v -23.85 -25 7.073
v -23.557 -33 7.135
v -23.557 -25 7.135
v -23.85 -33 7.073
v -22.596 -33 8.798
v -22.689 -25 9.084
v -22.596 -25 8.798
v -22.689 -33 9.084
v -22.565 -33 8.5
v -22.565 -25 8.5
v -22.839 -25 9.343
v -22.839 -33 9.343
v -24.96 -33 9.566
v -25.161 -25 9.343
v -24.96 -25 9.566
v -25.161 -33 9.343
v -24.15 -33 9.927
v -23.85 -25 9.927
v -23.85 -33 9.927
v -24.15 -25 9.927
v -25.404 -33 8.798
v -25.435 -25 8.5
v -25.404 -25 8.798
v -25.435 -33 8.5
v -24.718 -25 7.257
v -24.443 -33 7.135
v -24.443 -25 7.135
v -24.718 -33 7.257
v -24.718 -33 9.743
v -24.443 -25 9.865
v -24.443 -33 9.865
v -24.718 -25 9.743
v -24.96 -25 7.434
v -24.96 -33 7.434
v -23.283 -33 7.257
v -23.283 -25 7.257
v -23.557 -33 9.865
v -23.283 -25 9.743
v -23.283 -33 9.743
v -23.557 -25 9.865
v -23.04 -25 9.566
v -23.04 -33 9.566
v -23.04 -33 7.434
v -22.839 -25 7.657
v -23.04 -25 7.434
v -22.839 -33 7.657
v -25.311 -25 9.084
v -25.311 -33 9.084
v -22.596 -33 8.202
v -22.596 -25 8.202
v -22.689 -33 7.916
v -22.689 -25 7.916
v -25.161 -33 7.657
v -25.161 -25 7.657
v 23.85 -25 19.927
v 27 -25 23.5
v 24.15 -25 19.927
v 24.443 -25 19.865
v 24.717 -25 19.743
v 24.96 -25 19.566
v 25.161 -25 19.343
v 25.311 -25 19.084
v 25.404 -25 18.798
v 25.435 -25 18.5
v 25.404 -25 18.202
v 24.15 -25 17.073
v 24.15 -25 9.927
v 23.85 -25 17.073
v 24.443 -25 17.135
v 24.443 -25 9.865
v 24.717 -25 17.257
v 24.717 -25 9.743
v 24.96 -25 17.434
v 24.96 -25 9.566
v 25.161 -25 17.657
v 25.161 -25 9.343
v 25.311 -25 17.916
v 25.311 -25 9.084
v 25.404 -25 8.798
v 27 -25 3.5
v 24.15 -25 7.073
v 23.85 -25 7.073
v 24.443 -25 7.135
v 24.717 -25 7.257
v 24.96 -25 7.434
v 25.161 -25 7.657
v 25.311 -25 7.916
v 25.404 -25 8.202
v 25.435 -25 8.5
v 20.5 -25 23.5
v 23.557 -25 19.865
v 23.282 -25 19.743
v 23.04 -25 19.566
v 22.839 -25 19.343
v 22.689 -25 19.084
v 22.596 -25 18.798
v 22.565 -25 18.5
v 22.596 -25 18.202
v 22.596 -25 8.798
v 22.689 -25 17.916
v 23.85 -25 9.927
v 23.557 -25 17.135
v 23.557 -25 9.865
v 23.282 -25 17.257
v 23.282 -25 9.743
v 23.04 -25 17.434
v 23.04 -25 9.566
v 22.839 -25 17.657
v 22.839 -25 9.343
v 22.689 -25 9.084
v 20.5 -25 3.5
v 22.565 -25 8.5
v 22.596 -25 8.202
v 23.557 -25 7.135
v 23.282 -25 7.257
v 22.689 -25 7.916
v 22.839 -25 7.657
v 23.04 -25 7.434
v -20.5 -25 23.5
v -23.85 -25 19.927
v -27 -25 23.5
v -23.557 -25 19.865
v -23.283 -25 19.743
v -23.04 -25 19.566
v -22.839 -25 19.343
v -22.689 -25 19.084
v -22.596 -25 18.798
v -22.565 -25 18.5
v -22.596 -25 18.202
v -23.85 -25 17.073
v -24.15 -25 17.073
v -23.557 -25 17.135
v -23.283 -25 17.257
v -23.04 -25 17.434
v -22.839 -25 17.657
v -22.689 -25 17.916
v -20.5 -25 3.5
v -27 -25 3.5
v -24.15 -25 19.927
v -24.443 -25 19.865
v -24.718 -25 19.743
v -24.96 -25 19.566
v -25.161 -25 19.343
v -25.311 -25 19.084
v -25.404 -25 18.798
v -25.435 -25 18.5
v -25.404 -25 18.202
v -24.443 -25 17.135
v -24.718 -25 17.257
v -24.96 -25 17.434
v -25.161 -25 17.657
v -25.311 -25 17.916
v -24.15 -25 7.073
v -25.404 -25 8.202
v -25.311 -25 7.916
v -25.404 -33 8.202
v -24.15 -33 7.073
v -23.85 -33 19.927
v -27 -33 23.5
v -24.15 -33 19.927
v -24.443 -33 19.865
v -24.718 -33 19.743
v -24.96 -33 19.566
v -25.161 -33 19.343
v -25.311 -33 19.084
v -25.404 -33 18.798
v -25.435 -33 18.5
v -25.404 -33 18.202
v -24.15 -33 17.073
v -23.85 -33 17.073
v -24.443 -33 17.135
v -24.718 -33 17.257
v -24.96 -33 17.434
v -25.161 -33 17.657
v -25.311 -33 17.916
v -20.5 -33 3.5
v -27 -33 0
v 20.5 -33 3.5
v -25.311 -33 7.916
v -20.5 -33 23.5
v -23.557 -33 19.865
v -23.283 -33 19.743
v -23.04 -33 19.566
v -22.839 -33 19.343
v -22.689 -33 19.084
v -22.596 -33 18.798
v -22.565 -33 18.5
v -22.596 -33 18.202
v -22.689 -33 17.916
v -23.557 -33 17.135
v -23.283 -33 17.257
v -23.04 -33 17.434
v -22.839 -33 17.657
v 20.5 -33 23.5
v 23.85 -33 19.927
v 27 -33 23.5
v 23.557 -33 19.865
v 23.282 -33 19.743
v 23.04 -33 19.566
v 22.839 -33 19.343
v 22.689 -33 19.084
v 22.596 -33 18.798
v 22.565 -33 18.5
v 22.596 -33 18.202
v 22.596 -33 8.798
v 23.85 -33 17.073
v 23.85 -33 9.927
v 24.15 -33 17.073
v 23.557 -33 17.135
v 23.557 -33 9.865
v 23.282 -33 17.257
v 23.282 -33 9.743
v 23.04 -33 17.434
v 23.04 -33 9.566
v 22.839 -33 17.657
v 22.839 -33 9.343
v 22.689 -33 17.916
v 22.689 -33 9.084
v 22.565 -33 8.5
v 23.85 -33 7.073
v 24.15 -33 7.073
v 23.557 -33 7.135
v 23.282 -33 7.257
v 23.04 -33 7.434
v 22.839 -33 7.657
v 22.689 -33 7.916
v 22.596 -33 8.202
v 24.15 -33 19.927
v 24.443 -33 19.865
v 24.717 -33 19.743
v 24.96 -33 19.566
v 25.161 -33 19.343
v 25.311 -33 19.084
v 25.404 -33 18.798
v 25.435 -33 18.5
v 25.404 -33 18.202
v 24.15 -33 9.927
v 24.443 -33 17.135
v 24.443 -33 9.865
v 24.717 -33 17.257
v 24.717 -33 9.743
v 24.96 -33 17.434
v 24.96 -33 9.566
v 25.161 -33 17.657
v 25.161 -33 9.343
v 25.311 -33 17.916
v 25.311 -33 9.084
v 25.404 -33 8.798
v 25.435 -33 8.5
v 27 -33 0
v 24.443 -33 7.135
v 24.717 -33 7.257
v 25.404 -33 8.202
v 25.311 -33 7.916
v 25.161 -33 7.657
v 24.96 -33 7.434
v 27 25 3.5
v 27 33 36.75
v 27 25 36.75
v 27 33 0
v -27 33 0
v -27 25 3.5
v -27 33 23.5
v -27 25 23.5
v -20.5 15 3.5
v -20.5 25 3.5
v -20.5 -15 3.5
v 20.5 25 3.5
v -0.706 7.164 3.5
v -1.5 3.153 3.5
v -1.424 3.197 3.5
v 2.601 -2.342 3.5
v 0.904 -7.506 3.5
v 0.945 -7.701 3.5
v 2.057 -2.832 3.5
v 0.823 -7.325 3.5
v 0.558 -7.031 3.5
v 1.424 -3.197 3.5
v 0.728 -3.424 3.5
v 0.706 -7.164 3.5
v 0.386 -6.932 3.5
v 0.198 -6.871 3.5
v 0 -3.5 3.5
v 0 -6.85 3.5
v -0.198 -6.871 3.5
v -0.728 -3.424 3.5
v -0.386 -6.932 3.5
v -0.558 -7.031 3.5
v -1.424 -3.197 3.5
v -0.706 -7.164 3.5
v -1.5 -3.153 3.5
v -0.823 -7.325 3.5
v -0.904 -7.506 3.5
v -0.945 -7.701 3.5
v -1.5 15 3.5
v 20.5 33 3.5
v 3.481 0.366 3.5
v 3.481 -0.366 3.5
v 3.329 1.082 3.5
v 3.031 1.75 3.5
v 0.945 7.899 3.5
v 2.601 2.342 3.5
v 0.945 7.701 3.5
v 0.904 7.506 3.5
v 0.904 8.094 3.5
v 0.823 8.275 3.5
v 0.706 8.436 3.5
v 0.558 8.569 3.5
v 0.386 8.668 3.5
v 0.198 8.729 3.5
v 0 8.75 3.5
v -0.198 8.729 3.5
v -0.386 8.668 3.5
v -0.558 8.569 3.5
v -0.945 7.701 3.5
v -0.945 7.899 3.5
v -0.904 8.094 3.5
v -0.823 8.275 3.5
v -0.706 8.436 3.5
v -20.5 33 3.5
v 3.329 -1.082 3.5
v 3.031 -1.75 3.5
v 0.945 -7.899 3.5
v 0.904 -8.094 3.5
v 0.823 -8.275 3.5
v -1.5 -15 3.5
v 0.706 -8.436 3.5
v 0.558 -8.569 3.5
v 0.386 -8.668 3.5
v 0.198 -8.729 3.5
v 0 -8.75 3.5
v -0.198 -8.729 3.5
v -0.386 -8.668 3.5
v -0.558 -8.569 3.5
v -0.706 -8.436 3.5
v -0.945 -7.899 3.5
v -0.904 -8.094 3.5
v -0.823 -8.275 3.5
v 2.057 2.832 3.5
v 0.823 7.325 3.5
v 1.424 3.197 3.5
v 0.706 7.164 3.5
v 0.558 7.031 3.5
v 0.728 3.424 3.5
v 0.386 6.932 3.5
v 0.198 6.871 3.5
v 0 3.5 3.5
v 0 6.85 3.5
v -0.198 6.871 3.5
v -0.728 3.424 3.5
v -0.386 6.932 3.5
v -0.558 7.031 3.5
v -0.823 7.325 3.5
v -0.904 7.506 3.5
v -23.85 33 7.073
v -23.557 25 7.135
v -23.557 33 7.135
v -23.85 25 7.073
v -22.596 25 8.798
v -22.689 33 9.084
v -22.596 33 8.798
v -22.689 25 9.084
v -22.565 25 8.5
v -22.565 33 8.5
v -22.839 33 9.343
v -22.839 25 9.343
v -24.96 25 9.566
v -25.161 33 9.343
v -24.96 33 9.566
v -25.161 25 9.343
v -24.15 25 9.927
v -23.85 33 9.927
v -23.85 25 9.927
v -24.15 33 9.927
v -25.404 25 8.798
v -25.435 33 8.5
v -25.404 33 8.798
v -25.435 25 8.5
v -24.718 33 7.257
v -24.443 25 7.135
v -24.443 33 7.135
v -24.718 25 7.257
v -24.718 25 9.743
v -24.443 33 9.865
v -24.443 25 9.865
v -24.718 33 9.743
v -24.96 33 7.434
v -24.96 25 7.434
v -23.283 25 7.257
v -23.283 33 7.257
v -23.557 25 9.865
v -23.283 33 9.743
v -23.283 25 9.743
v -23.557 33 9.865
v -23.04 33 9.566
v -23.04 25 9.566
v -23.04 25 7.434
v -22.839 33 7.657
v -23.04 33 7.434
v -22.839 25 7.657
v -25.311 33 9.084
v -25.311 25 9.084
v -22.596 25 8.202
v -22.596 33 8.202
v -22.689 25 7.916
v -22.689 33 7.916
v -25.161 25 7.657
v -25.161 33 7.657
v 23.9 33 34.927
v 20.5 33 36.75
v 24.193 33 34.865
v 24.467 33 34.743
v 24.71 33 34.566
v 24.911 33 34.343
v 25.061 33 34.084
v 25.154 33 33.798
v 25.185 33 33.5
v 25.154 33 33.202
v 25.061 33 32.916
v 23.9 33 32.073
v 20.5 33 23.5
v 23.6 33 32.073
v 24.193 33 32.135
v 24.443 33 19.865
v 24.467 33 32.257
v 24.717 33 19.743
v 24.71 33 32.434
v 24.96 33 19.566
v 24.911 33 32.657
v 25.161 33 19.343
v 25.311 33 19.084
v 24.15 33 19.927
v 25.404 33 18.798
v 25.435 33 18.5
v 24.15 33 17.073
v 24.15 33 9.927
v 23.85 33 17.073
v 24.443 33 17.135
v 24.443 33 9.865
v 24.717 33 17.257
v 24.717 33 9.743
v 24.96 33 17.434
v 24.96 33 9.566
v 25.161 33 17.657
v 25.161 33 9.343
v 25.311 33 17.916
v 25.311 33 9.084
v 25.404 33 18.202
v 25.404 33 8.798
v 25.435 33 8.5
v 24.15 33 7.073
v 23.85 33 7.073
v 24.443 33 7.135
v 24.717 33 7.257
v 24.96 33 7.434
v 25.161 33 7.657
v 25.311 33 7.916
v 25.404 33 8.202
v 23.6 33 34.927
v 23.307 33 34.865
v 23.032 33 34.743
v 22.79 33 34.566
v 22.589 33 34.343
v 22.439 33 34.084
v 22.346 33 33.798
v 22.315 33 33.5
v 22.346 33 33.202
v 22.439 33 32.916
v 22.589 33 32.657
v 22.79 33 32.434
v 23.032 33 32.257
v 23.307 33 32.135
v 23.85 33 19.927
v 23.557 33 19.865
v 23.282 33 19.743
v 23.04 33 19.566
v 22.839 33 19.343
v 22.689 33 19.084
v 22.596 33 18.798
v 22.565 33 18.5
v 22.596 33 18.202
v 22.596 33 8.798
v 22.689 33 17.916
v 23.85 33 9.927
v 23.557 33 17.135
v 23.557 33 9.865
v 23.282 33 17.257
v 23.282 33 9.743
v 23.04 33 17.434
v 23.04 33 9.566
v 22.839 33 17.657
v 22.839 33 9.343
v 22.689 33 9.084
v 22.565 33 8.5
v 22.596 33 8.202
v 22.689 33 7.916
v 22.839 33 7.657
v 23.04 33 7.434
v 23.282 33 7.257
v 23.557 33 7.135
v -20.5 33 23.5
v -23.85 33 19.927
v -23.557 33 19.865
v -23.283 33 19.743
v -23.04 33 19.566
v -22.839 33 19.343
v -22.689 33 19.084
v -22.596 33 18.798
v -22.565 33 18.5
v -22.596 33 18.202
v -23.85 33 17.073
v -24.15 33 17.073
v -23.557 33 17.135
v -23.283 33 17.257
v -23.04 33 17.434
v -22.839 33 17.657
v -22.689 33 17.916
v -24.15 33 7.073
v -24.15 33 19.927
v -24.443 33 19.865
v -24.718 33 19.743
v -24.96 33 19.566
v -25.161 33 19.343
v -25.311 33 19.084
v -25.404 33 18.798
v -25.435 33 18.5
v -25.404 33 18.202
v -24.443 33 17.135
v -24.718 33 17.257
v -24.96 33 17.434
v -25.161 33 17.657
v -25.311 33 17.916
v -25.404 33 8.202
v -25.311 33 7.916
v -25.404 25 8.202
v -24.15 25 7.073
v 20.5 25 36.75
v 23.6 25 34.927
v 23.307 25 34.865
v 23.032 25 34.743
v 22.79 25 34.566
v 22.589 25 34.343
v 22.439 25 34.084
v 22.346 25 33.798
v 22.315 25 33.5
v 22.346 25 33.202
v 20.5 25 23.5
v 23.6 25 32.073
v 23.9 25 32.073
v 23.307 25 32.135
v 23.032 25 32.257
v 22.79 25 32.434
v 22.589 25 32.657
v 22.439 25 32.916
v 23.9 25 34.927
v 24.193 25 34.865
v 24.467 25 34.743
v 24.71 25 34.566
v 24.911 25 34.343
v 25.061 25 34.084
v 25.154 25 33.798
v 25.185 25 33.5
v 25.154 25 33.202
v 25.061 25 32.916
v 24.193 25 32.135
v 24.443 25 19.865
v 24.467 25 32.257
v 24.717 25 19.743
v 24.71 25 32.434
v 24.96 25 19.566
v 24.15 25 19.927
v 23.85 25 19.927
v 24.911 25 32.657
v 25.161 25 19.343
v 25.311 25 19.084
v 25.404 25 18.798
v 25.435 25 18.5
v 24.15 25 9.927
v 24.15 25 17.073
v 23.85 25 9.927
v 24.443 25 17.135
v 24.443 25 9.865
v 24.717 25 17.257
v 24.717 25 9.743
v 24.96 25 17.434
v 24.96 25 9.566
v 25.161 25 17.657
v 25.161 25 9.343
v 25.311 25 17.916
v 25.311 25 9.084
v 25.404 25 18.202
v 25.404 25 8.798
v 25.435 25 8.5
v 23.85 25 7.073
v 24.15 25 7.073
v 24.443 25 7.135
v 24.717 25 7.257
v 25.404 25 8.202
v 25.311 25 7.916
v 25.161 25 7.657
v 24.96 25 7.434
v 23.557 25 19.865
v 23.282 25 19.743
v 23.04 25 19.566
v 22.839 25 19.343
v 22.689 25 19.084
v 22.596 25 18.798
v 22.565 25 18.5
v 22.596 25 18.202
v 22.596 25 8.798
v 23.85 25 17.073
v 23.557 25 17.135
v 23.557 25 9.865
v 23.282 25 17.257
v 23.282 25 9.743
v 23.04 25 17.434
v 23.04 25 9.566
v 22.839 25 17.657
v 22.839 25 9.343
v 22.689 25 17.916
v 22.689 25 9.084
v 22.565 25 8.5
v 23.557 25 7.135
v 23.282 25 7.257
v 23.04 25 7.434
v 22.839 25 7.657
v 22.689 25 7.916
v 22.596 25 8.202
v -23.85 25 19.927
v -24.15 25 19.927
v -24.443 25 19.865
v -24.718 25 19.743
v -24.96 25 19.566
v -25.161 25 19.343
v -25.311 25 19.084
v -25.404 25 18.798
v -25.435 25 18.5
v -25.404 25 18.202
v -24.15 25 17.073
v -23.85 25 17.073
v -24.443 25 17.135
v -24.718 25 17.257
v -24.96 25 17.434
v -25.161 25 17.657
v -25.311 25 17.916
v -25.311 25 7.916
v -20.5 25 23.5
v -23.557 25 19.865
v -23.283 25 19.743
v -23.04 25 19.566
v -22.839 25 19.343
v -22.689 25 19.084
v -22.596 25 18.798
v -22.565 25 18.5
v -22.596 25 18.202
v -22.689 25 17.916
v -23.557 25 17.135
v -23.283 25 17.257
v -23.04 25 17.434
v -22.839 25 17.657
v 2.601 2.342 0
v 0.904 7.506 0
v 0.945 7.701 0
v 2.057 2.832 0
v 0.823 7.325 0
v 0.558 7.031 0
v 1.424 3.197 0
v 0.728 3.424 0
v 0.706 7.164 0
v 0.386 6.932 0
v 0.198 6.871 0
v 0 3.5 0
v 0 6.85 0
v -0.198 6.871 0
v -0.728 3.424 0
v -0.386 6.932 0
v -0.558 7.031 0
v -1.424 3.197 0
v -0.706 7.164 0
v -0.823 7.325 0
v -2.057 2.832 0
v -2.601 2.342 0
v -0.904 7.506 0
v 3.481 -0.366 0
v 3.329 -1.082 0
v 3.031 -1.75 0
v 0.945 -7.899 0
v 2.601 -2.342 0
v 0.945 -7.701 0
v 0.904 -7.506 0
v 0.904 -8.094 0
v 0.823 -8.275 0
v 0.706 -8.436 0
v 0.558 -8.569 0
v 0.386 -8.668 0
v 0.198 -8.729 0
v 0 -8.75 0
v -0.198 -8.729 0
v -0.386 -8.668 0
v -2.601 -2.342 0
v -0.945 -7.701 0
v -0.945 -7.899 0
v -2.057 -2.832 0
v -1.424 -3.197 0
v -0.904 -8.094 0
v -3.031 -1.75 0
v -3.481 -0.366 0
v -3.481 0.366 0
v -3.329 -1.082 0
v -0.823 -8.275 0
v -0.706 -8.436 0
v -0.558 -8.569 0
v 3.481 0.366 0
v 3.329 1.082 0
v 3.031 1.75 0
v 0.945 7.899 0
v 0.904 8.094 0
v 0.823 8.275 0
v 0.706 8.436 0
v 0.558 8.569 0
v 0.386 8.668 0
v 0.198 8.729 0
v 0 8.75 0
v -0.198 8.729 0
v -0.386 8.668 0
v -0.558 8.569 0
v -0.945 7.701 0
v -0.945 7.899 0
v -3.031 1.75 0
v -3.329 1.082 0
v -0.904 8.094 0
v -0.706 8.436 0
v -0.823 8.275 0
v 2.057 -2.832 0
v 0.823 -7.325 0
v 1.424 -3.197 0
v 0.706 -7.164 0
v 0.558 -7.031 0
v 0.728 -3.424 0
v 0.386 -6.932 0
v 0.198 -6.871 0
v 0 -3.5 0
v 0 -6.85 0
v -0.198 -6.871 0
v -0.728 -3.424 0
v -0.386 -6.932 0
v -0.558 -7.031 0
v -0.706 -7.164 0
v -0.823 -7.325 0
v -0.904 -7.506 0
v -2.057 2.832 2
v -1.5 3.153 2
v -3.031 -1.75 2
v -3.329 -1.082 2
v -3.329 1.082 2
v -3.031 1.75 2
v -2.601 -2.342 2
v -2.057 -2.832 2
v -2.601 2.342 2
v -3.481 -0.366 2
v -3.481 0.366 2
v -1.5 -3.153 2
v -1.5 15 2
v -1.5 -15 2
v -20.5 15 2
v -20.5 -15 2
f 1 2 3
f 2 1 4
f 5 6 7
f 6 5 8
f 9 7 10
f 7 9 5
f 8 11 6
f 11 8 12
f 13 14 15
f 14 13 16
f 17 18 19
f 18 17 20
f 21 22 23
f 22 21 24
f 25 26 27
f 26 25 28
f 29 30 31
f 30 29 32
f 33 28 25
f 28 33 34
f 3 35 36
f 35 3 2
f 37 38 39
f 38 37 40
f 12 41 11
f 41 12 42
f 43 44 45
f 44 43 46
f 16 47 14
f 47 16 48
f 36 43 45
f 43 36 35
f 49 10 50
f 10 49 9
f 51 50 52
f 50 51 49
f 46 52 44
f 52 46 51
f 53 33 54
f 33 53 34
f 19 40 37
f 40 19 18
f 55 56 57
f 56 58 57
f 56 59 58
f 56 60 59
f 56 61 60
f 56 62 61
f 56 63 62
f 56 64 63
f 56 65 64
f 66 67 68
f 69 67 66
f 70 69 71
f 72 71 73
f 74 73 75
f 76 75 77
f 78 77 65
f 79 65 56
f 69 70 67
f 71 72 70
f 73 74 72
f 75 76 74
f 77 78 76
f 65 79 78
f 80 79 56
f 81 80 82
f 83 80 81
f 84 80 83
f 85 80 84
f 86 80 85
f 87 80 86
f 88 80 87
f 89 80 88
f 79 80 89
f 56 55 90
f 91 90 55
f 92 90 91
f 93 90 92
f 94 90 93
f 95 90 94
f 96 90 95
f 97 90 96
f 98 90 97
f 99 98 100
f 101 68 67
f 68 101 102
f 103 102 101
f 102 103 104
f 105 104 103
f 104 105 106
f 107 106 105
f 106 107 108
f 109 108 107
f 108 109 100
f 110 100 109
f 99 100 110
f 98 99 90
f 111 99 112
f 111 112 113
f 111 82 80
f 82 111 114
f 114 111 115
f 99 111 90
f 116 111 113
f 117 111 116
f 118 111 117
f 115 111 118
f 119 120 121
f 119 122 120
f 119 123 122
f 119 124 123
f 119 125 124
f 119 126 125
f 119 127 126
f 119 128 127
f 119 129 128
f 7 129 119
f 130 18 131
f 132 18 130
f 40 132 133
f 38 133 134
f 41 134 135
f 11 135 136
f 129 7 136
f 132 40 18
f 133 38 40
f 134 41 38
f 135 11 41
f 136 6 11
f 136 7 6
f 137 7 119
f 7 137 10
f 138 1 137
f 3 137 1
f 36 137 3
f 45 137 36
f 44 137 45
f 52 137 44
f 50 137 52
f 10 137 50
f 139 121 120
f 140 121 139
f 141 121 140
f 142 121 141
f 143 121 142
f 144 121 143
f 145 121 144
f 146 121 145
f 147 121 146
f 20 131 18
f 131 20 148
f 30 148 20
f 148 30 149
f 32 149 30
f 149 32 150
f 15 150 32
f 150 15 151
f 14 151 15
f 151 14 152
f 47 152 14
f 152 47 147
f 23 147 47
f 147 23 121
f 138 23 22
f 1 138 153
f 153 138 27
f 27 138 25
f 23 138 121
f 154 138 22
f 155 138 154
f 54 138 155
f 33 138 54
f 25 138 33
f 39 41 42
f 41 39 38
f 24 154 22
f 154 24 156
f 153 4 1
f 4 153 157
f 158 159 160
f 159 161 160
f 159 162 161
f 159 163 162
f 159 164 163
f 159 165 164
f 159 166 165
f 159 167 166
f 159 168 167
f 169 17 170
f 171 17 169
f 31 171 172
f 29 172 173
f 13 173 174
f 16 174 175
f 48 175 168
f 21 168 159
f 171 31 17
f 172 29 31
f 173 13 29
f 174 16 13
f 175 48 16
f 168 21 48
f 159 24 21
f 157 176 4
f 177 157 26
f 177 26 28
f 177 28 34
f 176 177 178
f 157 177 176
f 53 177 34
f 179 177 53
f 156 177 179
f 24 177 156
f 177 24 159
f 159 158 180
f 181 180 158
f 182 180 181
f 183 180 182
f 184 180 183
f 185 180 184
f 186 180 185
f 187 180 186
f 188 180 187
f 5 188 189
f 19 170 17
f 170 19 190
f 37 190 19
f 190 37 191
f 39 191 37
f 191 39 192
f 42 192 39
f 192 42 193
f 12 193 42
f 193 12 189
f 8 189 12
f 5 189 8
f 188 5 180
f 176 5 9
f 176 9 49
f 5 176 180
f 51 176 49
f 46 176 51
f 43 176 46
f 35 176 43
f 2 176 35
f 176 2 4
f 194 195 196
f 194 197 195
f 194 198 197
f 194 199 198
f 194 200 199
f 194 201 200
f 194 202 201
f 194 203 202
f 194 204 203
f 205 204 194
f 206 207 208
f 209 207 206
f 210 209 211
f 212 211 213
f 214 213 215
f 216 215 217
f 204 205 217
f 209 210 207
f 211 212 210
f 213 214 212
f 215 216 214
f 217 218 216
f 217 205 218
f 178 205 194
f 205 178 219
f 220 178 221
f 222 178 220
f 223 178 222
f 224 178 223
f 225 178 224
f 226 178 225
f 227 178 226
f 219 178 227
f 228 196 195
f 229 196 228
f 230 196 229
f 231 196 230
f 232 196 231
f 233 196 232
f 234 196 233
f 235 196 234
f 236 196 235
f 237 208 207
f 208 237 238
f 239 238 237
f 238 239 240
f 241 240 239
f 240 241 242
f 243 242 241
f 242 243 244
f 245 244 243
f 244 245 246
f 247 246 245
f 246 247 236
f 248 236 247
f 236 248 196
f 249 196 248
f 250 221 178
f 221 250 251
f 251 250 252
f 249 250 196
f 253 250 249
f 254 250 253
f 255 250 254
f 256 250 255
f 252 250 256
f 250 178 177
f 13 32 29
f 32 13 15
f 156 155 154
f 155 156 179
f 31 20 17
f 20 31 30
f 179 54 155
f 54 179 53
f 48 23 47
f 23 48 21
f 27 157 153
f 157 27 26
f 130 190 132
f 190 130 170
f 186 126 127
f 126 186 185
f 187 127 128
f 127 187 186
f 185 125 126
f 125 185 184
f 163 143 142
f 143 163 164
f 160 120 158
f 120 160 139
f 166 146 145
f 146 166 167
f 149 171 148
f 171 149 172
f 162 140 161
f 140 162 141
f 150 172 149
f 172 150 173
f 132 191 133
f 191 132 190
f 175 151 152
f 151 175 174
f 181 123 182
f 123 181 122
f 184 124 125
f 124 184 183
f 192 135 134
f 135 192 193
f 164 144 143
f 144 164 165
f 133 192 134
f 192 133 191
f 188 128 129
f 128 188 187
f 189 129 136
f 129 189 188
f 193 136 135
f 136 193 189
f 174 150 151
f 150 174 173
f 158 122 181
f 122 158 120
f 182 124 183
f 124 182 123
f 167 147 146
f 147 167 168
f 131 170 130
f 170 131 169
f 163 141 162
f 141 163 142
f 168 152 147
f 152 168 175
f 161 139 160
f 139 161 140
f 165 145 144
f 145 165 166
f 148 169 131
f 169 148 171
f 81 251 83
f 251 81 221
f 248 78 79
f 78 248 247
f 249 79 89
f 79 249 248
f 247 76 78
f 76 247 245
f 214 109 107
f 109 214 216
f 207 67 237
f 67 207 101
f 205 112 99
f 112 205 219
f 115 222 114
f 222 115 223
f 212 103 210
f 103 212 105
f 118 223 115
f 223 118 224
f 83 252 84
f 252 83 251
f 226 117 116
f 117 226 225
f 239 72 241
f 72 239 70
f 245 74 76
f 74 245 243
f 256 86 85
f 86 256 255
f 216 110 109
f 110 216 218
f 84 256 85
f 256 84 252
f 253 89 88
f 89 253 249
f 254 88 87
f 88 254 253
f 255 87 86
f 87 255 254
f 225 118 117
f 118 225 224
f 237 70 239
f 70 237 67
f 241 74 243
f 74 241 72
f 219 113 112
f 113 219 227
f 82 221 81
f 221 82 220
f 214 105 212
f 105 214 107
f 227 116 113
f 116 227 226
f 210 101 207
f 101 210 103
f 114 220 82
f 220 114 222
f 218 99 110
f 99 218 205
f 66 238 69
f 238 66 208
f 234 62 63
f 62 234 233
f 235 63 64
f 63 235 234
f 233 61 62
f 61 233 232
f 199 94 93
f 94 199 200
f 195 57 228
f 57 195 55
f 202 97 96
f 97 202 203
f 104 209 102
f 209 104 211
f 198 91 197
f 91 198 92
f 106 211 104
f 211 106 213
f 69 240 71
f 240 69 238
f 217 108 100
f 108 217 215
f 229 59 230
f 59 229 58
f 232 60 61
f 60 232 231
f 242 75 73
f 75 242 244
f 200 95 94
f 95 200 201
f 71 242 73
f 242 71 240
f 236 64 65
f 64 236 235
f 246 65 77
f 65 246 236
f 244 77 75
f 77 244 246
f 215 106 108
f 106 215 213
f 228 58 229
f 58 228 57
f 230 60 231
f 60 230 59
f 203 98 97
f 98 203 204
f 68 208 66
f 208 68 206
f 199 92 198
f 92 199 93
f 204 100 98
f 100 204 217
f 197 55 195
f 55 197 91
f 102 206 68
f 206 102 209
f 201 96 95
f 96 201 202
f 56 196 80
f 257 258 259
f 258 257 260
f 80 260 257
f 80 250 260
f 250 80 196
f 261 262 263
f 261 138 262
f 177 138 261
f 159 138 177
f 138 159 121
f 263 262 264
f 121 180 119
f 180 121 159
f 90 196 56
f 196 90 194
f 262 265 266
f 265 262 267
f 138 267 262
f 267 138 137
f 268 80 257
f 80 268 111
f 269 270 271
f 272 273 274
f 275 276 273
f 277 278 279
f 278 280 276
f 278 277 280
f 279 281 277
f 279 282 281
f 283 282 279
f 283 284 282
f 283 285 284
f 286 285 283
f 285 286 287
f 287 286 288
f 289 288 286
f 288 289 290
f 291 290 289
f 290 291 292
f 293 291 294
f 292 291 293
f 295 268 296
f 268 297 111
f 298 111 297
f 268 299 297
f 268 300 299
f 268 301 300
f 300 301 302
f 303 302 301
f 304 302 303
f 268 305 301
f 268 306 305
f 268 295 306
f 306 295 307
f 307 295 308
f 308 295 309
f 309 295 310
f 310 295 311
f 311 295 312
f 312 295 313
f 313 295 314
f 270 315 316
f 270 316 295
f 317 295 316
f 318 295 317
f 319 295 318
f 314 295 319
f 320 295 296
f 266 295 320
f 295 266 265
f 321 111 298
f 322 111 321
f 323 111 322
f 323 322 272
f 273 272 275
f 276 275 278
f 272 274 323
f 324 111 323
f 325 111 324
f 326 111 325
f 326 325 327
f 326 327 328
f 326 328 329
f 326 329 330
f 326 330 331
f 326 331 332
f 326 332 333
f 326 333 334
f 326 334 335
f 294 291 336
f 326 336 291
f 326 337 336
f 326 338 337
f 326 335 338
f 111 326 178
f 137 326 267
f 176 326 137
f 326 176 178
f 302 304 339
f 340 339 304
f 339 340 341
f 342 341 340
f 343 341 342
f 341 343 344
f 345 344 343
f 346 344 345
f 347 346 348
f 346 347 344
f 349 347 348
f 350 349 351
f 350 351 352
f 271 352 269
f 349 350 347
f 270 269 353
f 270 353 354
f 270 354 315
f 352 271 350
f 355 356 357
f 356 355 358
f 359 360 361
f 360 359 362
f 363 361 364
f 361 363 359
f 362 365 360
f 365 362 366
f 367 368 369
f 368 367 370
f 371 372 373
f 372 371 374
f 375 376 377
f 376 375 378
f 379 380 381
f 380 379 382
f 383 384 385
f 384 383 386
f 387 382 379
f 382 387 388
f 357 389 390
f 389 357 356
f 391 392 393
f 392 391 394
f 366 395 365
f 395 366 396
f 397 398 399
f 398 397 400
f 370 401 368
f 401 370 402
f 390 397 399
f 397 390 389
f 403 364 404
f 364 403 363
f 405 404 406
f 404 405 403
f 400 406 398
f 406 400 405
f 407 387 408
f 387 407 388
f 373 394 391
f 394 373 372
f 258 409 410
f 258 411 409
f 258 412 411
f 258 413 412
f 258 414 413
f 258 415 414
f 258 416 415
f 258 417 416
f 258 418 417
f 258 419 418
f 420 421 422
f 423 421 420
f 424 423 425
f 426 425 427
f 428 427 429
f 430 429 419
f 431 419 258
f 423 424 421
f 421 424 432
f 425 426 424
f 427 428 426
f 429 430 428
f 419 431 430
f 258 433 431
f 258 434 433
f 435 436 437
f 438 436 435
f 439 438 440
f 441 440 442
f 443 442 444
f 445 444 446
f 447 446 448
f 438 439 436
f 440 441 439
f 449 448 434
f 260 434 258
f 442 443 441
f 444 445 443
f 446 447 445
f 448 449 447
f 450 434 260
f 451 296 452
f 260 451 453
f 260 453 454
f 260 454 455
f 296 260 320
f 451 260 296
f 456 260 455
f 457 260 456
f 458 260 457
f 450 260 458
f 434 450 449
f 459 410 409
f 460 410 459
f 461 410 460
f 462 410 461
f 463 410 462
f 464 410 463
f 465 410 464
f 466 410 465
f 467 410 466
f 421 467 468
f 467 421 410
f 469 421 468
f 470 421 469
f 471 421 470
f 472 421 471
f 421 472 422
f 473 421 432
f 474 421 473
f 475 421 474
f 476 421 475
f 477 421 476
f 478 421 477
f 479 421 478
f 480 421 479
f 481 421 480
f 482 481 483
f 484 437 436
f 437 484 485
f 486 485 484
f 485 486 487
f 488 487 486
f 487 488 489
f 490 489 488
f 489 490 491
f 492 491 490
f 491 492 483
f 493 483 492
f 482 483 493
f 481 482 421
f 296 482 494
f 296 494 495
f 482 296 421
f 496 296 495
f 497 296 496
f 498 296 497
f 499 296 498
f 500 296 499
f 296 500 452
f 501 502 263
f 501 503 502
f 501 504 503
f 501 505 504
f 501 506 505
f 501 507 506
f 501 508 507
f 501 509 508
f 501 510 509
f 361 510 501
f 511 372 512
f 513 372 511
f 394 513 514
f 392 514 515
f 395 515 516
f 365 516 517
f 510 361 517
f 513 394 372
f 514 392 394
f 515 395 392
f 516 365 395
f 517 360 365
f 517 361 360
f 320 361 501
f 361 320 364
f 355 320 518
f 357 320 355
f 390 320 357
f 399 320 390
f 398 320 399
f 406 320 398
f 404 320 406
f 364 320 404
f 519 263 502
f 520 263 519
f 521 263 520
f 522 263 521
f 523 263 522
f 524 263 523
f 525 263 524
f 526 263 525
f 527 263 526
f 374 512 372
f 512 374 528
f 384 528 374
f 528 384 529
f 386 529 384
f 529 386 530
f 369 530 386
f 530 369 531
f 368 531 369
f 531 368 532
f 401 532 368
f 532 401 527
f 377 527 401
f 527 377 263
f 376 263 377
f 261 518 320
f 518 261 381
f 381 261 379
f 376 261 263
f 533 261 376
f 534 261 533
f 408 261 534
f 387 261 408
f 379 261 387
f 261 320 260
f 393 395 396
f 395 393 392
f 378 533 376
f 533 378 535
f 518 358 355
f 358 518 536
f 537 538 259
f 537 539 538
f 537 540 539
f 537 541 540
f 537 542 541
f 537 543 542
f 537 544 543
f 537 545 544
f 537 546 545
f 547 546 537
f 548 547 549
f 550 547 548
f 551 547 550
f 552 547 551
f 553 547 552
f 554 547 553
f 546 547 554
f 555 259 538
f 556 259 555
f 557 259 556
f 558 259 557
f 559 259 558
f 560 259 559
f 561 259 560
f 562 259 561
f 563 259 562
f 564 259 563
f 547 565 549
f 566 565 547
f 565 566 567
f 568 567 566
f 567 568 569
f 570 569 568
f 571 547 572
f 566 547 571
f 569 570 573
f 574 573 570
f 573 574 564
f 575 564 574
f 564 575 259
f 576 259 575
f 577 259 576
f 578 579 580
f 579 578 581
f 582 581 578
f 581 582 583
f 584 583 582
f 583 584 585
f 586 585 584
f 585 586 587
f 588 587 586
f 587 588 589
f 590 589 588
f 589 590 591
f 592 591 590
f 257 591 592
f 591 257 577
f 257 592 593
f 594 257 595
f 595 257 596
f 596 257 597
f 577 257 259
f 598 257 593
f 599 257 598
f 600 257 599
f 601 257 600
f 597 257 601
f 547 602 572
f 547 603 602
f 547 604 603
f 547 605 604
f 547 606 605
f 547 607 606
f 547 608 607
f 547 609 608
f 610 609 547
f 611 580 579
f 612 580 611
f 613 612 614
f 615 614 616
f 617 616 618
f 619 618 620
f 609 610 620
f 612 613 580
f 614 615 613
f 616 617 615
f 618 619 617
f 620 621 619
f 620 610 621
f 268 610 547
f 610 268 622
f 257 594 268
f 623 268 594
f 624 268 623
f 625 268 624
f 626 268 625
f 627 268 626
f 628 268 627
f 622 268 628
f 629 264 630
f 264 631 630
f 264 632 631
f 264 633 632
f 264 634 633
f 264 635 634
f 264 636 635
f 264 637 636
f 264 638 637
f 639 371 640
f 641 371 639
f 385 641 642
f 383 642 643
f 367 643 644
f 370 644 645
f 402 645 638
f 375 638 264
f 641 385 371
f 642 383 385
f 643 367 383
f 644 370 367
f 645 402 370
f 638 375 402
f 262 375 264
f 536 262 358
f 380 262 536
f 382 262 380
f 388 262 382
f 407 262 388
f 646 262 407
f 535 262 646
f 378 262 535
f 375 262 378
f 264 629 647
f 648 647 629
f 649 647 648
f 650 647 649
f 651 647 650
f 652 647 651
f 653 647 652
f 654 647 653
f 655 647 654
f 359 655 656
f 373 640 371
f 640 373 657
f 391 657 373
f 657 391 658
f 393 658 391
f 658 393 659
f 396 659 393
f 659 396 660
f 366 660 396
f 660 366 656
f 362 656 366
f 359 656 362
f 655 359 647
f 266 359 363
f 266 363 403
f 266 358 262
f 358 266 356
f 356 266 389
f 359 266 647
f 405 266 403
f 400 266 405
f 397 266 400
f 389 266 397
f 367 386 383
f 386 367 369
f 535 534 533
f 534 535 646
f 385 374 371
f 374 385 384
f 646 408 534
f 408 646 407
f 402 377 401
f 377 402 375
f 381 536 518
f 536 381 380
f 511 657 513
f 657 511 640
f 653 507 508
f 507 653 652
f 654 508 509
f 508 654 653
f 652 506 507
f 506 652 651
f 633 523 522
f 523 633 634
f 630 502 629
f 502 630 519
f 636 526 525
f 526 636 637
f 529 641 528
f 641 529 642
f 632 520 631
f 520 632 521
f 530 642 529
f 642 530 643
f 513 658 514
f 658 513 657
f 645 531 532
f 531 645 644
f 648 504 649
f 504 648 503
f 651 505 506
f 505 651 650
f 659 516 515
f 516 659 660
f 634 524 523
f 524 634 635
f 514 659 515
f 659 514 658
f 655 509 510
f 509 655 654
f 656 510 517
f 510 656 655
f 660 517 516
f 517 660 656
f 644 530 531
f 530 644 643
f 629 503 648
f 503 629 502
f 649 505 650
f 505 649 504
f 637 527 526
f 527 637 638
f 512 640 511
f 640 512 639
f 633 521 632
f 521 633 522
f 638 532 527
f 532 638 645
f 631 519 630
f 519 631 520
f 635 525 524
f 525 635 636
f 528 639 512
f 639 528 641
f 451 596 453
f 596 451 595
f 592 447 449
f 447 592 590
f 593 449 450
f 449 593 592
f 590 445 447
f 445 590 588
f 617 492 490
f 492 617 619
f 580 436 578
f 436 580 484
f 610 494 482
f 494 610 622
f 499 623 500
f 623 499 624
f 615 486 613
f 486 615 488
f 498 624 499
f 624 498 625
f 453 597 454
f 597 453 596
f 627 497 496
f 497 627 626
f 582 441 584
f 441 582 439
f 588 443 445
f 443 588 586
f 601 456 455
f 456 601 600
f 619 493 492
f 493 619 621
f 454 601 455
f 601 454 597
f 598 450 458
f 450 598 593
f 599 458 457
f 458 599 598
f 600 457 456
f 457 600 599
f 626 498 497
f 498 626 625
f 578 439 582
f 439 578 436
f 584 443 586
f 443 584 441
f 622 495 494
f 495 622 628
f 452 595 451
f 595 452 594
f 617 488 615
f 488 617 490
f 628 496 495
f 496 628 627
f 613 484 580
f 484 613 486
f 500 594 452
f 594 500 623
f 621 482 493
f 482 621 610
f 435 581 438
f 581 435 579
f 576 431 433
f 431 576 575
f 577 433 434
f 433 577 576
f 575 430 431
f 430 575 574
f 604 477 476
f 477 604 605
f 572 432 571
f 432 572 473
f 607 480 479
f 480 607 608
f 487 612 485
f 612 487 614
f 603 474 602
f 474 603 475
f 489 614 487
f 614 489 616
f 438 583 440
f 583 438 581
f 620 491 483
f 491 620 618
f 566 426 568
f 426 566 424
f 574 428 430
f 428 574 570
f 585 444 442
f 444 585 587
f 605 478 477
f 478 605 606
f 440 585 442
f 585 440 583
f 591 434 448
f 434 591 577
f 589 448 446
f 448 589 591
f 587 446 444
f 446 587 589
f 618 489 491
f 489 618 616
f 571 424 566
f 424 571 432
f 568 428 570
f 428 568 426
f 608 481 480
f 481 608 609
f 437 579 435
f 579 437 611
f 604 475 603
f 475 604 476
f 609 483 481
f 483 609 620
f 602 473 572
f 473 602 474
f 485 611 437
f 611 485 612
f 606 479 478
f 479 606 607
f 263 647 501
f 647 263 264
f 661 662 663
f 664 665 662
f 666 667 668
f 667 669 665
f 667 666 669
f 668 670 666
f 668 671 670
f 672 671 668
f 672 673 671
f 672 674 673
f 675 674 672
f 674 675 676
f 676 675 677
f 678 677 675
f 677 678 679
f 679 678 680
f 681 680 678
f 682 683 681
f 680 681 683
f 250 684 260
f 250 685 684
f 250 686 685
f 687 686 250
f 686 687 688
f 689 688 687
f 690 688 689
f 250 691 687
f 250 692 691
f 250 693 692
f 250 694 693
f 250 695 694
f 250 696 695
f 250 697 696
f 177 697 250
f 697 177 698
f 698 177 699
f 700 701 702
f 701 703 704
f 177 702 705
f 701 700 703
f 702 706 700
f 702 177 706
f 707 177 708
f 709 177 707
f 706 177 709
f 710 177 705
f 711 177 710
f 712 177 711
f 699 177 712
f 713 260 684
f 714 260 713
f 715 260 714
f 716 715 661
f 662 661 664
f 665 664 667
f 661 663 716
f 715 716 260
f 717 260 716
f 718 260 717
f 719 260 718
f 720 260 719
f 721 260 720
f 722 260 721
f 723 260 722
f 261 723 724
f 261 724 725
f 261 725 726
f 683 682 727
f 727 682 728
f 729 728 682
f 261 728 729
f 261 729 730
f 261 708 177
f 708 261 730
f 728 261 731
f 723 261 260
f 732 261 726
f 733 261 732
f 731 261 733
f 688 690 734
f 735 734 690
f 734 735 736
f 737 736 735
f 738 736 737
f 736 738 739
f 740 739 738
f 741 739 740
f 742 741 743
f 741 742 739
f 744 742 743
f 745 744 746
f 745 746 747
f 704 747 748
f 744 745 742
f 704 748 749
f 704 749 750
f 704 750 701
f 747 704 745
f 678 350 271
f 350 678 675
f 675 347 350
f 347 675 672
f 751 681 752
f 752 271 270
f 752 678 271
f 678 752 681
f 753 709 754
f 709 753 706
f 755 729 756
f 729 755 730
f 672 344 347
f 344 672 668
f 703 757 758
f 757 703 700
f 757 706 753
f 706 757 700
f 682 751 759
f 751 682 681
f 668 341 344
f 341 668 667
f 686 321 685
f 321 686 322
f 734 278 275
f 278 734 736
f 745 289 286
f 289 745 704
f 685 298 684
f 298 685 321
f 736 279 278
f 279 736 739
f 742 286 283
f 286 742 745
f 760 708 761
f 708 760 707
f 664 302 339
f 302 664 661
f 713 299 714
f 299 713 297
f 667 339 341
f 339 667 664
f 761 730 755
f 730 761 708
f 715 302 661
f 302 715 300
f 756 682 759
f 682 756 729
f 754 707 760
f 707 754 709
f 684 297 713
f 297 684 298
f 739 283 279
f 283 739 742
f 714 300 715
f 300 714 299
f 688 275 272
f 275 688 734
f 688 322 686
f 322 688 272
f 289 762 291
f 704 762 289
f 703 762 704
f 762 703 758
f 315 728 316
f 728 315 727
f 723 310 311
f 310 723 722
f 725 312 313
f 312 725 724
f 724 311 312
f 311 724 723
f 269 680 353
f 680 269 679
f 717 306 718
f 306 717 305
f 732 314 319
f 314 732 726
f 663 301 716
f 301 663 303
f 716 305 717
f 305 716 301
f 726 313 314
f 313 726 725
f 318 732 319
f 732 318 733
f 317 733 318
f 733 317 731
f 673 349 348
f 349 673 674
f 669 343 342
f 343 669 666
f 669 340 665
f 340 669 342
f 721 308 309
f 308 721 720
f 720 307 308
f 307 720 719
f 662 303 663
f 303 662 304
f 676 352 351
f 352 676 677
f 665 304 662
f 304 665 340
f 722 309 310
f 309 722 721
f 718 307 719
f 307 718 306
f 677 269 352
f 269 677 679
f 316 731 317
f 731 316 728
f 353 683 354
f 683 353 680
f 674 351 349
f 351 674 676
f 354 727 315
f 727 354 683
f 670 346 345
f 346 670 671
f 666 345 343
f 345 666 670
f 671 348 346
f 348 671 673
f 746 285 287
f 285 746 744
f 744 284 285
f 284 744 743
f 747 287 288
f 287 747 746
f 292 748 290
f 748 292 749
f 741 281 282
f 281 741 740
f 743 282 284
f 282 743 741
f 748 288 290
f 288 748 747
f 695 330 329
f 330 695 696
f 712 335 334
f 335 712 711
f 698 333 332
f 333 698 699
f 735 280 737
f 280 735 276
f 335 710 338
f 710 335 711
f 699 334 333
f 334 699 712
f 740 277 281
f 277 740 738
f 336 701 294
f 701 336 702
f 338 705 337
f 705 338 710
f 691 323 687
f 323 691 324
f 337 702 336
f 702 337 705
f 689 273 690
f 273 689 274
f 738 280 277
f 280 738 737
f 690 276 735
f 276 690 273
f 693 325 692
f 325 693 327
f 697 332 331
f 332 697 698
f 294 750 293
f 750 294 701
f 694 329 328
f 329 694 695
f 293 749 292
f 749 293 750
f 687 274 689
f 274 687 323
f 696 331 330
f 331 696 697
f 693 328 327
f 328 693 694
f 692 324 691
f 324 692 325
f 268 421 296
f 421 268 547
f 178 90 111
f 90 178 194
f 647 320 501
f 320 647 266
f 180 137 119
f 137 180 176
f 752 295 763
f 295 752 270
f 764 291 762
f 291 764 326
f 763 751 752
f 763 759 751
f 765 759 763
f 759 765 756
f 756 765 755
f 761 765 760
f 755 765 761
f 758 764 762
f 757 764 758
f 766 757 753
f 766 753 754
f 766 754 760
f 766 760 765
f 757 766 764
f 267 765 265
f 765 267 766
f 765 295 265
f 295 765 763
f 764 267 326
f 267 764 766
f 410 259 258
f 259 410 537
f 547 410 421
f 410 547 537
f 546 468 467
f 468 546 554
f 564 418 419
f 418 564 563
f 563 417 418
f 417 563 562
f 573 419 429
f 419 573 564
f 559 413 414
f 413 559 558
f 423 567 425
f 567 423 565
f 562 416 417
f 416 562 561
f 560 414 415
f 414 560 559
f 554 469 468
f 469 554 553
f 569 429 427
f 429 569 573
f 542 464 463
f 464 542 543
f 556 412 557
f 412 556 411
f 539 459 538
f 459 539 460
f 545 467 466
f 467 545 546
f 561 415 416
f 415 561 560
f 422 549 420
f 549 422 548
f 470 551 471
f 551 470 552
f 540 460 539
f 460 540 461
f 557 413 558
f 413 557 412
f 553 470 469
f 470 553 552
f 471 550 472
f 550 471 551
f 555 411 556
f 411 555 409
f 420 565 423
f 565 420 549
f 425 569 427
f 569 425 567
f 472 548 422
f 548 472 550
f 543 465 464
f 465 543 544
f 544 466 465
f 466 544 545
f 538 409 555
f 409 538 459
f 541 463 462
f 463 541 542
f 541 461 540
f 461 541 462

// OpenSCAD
//general
$fn = 30;                      //convexity of general curved faces
thickness = 3.5;                 //thickness next to flat servo

servo_distance = 50;             //distance between the inner of the two servo's pads

//circle servo horn measurements
horn_center_hole = 7;            //diameter of the center hole (for screw)
horn_outer_hole_diameters = 1.9;  //diameter of the outer holes for screwing down horn
horn_outer_holes_center_dist = 7.8;//distance from center to the outer holes
horn_dist = 5;                  //distance of horn from wall against servo pad

//servo pad
servo_hole_diameter = 2.87;           //diamter of holes for servo attachment
servo_hole_width = 10;             //width of short distance between hole so same side of servo
servo_hole_length = 48;            //length of long distance between holes on either side of servo
servo_pad_width = 20;              //width of servo pad
servo_pad_length = 54;             //length of servo pad
servo_length = 41;                //wideness (length) of servo
servo_pad_thickness = 8;           //thickness of servo pad
servo_width = servo_pad_length;     //width or thin side of the servo

//arm cutout
cutout_width = 30;        //width of cutout
cutout_depth = 1.5;         //depth of cutout

module horn(){
   cylinder(d=horn_center_hole, h=thickness);
   translate([horn_outer_holes_center_dist, 0, 0])
   cylinder(d=horn_outer_hole_diameters, h=thickness);
   translate([-horn_outer_holes_center_dist, 0, 0])
   cylinder(d=horn_outer_hole_diameters, h=thickness);
}

module servo_holes(){
   translate([servo_pad_length/2 - servo_hole_length/2, servo_pad_width/2 - servo_hole_width/2, 0])
   cylinder(d = servo_hole_diameter, h = servo_pad_thickness);
   translate([servo_pad_length/2 - servo_hole_length/2, servo_pad_width/2 + servo_hole_width/2, 0])
   cylinder(d = servo_hole_diameter, h = servo_pad_thickness);
   translate([servo_pad_length/2 + servo_hole_length/2, servo_pad_width/2 - servo_hole_width/2, 0])
   cylinder(d = servo_hole_diameter, h = servo_pad_thickness);
   translate([servo_pad_length/2 + servo_hole_length/2, servo_pad_width/2 + servo_hole_width/2, 0])
   cylinder(d = servo_hole_diameter, h = servo_pad_thickness);
}


module servo_pad(){
   translate([servo_pad_length/-2,0,thickness])
   rotate([90,0,0])
   difference(){
      cube([servo_pad_length, servo_pad_width, servo_pad_thickness]);
      servo_holes();
   }
}

module hinge_section(){
    //hole is servo_pad_width/2 height
   difference(){
      cube([(servo_pad_length - servo_length) / 2, servo_pad_thickness, servo_pad_width/2 + (servo_pad_length - servo_length) / 4]);
      translate([(servo_pad_length - servo_length) / 4, 0, servo_pad_width / 2])
      rotate([-90,0,0])
      cylinder(d = servo_hole_diameter, h=servo_pad_thickness);
   }
}

module body(){
   translate([servo_pad_length/-2, servo_distance/-2 - servo_pad_thickness, 0])
   cube([servo_pad_length, servo_distance + 2 * servo_pad_thickness, thickness]);
   translate([0, servo_distance/-2, 0])
   servo_pad();
   translate([0, servo_distance/2 + servo_pad_thickness, 0])
   servo_pad();
}

difference(){
   body();
   //servos
   translate([servo_length/-2, servo_distance/-2 - servo_pad_thickness - 1, thickness])
   cube([servo_length, servo_distance + 2 * servo_pad_thickness + 2, servo_pad_width + 2]);
   //cutout
   translate([servo_length/-2, cutout_width / -2, thickness - cutout_depth])
   cube([servo_length/2 - 1.5, cutout_width, cutout_depth]);
   
   rotate(90)
   horn();
   
}
translate([servo_pad_length/2 - (servo_pad_length - servo_length) / 2 ,servo_distance/2,thickness+servo_pad_width])
hinge_section();

/*
difference(){
   hulled_body();
   
   union(){
      translate([-0.5*servo_length,-0.5*horn_diameter,thickness])
      cube([servo_length, horn_diameter, servo_pad_width+10]);
      
      translate([-0.5*servo_width, -0.5*horn_diameter, thickness])
      cube([servo_width, 0.5*horn_diameter-servo_pad_thickness, servo_pad_width+10]);
      
      translate([-0.5 * servo_pad_length, -0.1, thickness])
      rotate([90,0,0])
      servo_pad();
      
      horn();
   }
}   


//servo_pad();
/*
module horn(){
   difference(){
      cylinder(d=horn_diameter, h=thickness, $fn = 60);
      cylinder(d=horn_center_hole, h=thickness);
      translate([horn_outer_holes_center_dist, 0, 0])
      cylinder(d=horn_outer_hole_diameters, h=thickness);
      translate([-horn_outer_holes_center_dist, 0, 0])
      cylinder(d=horn_outer_hole_diameters, h=thickness);
   }   
}

module servo_pad(){
   difference(){
      cube([servo_pad_length, servo_pad_width, servo_pad_thickness]);
      translate([servo_pad_length/2 - servo_hole_length/2, servo_pad_width/2 - servo_hole_width/2, 0])
      cylinder(d = servo_hole_diameter, h = servo_pad_thickness);
      translate([servo_pad_length/2 - servo_hole_length/2, servo_pad_width/2 + servo_hole_width/2, 0])
      cylinder(d = servo_hole_diameter, h = servo_pad_thickness);
      translate([servo_pad_length/2 + servo_hole_length/2, servo_pad_width/2 - servo_hole_width/2, 0])
      cylinder(d = servo_hole_diameter, h = servo_pad_thickness);
      translate([servo_pad_length/2 + servo_hole_length/2, servo_pad_width/2 + servo_hole_width/2, 0])
      cylinder(d = servo_hole_diameter, h = servo_pad_thickness);
   }  
}
*/
